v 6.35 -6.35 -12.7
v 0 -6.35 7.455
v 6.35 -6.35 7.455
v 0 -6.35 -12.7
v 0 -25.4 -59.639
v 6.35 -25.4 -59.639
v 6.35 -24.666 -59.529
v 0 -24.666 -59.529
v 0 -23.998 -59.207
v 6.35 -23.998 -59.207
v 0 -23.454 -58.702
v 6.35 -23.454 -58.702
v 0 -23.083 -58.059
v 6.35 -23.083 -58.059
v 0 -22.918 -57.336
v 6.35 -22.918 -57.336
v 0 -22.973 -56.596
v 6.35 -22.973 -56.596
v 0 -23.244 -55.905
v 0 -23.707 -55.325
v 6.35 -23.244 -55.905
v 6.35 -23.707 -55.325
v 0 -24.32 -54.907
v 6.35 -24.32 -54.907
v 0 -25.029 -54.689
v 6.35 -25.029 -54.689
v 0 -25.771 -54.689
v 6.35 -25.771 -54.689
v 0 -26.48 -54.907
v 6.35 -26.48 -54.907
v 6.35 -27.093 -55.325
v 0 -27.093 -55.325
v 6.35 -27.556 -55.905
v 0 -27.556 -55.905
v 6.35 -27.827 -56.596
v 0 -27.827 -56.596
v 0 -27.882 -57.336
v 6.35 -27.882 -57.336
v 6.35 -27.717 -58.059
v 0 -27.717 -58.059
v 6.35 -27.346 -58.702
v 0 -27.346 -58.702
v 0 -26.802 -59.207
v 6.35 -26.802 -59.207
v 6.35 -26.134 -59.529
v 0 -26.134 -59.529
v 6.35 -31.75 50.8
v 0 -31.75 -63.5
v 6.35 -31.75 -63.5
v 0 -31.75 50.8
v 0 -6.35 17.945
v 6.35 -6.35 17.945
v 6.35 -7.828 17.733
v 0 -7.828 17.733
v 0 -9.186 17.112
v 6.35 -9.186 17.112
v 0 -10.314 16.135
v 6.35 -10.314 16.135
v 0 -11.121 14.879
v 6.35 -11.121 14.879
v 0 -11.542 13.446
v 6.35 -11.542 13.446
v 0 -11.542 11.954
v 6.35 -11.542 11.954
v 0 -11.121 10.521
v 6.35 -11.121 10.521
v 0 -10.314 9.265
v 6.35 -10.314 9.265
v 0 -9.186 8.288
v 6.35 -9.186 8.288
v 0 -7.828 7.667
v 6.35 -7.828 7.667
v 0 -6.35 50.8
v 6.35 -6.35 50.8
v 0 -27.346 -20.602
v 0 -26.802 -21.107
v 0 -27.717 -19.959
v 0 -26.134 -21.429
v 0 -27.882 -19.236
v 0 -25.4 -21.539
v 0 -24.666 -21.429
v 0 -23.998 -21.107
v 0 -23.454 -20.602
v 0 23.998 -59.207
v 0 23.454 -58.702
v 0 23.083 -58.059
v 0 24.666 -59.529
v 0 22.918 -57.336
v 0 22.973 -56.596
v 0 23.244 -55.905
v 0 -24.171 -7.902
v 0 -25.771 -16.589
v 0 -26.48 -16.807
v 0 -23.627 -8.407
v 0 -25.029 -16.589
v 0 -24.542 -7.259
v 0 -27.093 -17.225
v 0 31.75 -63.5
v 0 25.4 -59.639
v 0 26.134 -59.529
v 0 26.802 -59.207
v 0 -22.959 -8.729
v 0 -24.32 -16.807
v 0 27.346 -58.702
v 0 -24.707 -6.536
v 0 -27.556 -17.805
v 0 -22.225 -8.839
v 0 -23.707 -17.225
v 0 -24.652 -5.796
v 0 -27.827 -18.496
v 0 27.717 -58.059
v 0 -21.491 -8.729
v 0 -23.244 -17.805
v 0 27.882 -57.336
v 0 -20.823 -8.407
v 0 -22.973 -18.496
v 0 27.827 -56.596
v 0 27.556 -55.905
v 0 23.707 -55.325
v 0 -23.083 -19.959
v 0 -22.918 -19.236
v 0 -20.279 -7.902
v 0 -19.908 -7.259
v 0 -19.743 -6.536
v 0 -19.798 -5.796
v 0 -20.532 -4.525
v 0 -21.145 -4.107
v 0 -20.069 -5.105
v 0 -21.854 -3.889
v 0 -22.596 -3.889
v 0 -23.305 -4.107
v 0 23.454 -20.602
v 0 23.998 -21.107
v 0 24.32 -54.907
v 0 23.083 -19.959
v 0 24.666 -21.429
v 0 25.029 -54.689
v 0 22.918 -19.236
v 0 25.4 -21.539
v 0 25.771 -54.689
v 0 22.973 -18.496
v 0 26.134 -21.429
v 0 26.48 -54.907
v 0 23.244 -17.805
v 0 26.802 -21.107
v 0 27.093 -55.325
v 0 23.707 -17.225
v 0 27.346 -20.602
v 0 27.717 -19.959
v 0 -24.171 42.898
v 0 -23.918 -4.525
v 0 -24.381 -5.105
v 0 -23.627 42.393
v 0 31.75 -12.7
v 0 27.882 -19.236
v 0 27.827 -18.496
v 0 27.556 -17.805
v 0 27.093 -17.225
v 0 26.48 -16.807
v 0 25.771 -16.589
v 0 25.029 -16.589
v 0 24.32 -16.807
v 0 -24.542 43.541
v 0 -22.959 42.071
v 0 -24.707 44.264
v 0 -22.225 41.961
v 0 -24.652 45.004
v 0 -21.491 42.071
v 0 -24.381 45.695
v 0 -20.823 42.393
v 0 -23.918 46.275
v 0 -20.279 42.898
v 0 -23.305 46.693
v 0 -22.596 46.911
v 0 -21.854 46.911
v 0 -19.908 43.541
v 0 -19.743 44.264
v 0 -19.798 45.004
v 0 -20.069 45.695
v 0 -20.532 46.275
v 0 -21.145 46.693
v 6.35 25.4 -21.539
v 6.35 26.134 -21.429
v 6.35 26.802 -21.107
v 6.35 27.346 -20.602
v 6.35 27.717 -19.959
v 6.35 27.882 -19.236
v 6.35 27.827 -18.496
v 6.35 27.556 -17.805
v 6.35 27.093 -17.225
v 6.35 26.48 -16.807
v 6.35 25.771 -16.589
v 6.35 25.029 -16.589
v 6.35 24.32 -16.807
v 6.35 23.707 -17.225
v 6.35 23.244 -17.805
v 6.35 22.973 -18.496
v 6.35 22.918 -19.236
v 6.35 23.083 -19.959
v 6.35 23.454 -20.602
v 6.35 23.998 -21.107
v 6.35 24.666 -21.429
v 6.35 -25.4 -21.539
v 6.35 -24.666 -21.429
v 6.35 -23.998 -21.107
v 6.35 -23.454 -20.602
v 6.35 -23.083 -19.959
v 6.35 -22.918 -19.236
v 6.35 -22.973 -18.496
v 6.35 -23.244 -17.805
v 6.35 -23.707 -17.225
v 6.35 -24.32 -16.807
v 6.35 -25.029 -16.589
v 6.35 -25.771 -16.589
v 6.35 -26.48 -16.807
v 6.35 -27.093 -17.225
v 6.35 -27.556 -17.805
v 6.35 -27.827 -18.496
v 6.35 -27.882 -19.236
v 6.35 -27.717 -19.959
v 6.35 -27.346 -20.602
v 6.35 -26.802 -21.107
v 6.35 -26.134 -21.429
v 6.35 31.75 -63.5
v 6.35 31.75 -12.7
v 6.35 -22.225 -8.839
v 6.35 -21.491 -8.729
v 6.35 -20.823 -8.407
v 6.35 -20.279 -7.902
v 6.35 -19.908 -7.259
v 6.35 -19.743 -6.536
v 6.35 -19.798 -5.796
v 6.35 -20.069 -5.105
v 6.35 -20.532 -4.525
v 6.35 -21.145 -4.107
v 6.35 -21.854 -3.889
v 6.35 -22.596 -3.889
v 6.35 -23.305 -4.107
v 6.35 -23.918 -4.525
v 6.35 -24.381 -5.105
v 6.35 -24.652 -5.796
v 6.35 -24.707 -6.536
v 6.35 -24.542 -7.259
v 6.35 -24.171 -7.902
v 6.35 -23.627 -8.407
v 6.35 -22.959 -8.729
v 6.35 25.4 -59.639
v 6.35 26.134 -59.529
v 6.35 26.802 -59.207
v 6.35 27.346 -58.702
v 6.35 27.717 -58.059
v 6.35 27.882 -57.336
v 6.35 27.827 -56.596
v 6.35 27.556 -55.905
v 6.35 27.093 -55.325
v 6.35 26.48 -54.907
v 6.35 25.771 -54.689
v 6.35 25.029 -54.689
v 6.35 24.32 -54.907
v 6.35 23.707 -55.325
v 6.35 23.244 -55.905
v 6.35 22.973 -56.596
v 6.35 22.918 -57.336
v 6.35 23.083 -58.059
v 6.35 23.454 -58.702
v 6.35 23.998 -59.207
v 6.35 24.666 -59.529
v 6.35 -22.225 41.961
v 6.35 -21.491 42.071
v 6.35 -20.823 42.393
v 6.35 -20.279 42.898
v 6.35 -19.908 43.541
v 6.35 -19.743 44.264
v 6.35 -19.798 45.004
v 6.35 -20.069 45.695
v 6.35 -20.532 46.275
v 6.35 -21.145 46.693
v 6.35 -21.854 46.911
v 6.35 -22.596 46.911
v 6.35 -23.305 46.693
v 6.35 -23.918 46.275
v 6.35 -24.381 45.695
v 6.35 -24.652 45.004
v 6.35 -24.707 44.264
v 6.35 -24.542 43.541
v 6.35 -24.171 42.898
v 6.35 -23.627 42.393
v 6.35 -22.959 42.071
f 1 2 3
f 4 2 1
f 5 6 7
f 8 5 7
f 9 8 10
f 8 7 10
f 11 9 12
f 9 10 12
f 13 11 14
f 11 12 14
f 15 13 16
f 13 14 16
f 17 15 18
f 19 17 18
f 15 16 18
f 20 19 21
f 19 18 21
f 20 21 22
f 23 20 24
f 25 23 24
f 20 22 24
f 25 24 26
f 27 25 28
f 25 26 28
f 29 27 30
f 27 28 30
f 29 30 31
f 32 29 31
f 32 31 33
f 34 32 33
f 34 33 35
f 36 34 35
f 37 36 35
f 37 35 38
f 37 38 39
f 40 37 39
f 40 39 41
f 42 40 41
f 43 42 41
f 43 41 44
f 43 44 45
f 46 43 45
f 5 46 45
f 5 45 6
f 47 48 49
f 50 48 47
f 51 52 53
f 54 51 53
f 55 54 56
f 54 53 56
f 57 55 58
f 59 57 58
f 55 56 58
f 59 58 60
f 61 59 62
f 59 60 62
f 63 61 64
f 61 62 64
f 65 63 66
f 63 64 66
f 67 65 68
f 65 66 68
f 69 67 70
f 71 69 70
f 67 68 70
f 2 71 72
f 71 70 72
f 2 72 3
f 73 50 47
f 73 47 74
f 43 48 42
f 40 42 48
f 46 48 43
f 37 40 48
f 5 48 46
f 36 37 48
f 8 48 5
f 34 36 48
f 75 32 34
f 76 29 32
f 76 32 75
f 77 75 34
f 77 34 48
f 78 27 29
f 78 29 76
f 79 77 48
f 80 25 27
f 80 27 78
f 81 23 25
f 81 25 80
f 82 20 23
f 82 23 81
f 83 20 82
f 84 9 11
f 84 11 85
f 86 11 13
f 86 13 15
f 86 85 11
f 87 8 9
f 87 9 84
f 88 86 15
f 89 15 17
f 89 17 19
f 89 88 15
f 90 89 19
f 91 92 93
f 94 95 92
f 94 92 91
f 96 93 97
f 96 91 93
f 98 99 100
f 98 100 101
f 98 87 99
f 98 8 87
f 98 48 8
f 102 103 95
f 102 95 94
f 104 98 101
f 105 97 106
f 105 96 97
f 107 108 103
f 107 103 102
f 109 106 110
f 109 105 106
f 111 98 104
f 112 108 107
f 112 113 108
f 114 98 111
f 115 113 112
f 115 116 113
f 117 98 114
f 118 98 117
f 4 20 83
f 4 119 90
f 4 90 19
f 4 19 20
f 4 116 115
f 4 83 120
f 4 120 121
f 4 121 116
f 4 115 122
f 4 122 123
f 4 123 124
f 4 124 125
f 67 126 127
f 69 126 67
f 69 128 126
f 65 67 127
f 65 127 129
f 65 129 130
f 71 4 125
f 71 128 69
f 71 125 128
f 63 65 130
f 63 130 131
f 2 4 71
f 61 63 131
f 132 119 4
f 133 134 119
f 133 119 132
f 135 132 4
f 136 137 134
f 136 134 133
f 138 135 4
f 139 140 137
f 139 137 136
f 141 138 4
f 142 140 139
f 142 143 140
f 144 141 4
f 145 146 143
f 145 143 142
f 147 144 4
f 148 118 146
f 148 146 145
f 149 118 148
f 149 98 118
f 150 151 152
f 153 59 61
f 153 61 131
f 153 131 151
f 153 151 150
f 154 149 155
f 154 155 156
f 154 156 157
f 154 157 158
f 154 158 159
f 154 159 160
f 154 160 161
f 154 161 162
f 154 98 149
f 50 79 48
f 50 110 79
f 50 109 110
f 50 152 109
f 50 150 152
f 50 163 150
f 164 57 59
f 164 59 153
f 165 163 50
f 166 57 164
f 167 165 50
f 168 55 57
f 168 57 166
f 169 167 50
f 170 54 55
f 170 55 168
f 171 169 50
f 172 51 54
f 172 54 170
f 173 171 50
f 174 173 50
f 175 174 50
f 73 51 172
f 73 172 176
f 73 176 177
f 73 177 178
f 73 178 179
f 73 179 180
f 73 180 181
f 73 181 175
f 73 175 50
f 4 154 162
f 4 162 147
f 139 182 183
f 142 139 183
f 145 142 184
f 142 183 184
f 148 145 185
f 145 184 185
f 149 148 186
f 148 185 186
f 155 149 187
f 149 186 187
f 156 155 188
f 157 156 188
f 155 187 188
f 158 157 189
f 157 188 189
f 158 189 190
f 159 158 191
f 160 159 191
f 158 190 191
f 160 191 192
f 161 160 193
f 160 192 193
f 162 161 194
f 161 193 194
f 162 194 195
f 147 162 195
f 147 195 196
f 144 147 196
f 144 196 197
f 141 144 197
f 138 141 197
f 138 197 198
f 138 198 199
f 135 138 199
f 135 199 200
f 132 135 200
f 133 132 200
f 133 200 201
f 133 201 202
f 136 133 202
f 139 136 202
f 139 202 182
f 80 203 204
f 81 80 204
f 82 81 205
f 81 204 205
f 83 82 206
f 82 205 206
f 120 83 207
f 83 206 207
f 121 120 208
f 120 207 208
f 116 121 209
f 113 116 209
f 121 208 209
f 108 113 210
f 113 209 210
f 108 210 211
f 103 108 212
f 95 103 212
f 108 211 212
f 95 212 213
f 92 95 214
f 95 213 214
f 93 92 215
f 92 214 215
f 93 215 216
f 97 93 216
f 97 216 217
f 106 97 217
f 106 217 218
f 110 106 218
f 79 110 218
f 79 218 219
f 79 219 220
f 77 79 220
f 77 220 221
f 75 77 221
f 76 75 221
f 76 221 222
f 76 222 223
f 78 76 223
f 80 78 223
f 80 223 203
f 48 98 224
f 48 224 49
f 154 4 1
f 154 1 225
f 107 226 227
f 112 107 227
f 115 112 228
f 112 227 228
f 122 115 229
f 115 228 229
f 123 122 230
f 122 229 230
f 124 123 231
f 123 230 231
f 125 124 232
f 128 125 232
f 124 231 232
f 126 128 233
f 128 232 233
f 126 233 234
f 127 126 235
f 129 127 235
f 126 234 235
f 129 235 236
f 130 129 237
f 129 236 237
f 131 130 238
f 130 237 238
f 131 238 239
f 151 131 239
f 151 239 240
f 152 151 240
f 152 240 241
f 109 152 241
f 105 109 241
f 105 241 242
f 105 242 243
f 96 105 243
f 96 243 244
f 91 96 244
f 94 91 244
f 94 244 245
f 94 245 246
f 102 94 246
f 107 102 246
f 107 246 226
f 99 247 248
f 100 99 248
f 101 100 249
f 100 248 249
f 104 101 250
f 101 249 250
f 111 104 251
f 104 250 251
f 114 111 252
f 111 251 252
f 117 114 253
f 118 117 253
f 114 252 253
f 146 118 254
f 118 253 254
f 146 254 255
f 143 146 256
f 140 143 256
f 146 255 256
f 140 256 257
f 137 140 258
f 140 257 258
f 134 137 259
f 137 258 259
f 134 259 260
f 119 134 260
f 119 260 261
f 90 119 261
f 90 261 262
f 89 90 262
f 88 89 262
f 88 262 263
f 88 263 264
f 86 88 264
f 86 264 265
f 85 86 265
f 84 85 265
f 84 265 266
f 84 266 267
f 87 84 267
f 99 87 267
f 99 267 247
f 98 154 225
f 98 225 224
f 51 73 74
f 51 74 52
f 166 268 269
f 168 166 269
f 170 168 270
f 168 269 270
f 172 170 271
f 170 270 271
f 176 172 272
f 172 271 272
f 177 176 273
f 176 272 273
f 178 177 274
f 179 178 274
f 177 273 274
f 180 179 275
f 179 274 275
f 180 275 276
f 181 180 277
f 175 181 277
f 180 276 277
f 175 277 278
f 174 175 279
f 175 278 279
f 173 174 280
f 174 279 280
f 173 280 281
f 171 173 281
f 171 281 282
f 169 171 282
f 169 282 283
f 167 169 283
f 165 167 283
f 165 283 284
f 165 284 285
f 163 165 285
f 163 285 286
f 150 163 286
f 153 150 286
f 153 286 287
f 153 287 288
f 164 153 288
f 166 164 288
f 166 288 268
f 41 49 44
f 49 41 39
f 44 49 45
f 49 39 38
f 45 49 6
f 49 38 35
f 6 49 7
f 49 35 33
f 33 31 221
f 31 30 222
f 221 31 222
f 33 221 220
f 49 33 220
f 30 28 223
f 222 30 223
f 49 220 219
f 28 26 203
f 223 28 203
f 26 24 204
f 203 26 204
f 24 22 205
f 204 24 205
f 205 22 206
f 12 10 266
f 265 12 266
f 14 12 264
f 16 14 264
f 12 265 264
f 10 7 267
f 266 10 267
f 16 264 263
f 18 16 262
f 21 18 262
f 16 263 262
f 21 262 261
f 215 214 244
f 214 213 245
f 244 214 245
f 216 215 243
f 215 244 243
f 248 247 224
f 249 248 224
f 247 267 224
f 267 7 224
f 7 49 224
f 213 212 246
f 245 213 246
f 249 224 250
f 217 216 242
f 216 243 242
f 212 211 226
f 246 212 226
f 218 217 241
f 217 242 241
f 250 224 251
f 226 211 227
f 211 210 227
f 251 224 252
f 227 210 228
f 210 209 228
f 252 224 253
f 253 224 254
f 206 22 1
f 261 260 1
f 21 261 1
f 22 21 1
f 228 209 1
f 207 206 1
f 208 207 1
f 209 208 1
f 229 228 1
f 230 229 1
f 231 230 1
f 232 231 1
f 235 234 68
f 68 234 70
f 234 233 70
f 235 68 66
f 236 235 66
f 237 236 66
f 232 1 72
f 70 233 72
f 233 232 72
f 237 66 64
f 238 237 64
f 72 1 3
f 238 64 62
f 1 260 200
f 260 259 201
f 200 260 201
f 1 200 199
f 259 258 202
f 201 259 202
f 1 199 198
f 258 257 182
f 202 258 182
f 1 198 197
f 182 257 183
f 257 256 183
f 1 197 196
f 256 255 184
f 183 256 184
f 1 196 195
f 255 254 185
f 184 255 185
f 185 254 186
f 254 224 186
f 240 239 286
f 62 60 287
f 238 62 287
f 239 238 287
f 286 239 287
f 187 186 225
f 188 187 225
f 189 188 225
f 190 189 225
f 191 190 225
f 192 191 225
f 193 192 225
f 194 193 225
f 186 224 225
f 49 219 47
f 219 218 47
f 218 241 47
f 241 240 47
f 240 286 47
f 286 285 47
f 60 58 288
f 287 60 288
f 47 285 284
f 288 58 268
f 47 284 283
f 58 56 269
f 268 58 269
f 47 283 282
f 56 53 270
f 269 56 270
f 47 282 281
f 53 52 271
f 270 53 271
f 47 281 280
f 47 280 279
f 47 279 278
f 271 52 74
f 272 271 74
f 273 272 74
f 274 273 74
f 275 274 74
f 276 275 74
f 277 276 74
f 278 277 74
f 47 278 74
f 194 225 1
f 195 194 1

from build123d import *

# Parameters (mm, degrees)
BOSS_EXTRUDE1_DEPTH            = 6.35
F_9_0_196_DIAMETER_HOLE1_D     = 4.9784
F_9_0_196_DIAMETER_HOLE1_DEPTH = 70.104
F_9_0_196_DIAMETER_HOLE1_TIP   = 1.495662253
F_9_0_196_DIAMETER_HOLE2_D     = 4.9784
F_9_0_196_DIAMETER_HOLE2_DEPTH = 70.104
F_9_0_196_DIAMETER_HOLE2_TIP   = 1.495662253
Z_0_413_DIAMETER_HOLE1_D       = 10.4902
Z_0_413_DIAMETER_HOLE1_DEPTH   = 70.104
Z_0_413_DIAMETER_HOLE1_TIP     = 3.151574033


with BuildPart() as part:
    # Sketch1 → Boss-Extrude1 (new body)
    with BuildSketch(Plane(origin=(0, 0, 0), x_dir=(0, 0, -1), z_dir=(1, 0, 0))):
        Polygon((-50.8, -6.35), (12.7, -6.35), (12.7, 31.75), (63.5, 31.75), (63.5, -31.75), (-50.8, -31.75), align=None)
    extrude(amount=BOSS_EXTRUDE1_DEPTH)

    # #9 (0.196) Diameter Hole1
    with Locations(Plane.ZY):
        with Locations((44.45, -22.225), (-6.35, -22.225)):
            Hole(F_9_0_196_DIAMETER_HOLE1_D / 2, depth=F_9_0_196_DIAMETER_HOLE1_DEPTH)
            with Locations((0, 0, -(F_9_0_196_DIAMETER_HOLE1_DEPTH + F_9_0_196_DIAMETER_HOLE1_TIP / 2))):  # 118° drill point
                Cone(0, F_9_0_196_DIAMETER_HOLE1_D / 2, F_9_0_196_DIAMETER_HOLE1_TIP, mode=Mode.SUBTRACT)

    # #9 (0.196) Diameter Hole2
    with Locations(Plane.ZY):
        with Locations((-57.15, -25.4), (-19.05, -25.4), (-19.05, 25.4), (-57.15, 25.4)):
            Hole(F_9_0_196_DIAMETER_HOLE2_D / 2, depth=F_9_0_196_DIAMETER_HOLE2_DEPTH)
            with Locations((0, 0, -(F_9_0_196_DIAMETER_HOLE2_DEPTH + F_9_0_196_DIAMETER_HOLE2_TIP / 2))):  # 118° drill point
                Cone(0, F_9_0_196_DIAMETER_HOLE2_D / 2, F_9_0_196_DIAMETER_HOLE2_TIP, mode=Mode.SUBTRACT)

    # Z (0.413) Diameter Hole1
    with Locations(Plane.ZY):
        with Locations((12.7, -6.35)):
            Hole(Z_0_413_DIAMETER_HOLE1_D / 2, depth=Z_0_413_DIAMETER_HOLE1_DEPTH)
            with Locations((0, 0, -(Z_0_413_DIAMETER_HOLE1_DEPTH + Z_0_413_DIAMETER_HOLE1_TIP / 2))):  # 118° drill point
                Cone(0, Z_0_413_DIAMETER_HOLE1_D / 2, Z_0_413_DIAMETER_HOLE1_TIP, mode=Mode.SUBTRACT)


solid = part.part
